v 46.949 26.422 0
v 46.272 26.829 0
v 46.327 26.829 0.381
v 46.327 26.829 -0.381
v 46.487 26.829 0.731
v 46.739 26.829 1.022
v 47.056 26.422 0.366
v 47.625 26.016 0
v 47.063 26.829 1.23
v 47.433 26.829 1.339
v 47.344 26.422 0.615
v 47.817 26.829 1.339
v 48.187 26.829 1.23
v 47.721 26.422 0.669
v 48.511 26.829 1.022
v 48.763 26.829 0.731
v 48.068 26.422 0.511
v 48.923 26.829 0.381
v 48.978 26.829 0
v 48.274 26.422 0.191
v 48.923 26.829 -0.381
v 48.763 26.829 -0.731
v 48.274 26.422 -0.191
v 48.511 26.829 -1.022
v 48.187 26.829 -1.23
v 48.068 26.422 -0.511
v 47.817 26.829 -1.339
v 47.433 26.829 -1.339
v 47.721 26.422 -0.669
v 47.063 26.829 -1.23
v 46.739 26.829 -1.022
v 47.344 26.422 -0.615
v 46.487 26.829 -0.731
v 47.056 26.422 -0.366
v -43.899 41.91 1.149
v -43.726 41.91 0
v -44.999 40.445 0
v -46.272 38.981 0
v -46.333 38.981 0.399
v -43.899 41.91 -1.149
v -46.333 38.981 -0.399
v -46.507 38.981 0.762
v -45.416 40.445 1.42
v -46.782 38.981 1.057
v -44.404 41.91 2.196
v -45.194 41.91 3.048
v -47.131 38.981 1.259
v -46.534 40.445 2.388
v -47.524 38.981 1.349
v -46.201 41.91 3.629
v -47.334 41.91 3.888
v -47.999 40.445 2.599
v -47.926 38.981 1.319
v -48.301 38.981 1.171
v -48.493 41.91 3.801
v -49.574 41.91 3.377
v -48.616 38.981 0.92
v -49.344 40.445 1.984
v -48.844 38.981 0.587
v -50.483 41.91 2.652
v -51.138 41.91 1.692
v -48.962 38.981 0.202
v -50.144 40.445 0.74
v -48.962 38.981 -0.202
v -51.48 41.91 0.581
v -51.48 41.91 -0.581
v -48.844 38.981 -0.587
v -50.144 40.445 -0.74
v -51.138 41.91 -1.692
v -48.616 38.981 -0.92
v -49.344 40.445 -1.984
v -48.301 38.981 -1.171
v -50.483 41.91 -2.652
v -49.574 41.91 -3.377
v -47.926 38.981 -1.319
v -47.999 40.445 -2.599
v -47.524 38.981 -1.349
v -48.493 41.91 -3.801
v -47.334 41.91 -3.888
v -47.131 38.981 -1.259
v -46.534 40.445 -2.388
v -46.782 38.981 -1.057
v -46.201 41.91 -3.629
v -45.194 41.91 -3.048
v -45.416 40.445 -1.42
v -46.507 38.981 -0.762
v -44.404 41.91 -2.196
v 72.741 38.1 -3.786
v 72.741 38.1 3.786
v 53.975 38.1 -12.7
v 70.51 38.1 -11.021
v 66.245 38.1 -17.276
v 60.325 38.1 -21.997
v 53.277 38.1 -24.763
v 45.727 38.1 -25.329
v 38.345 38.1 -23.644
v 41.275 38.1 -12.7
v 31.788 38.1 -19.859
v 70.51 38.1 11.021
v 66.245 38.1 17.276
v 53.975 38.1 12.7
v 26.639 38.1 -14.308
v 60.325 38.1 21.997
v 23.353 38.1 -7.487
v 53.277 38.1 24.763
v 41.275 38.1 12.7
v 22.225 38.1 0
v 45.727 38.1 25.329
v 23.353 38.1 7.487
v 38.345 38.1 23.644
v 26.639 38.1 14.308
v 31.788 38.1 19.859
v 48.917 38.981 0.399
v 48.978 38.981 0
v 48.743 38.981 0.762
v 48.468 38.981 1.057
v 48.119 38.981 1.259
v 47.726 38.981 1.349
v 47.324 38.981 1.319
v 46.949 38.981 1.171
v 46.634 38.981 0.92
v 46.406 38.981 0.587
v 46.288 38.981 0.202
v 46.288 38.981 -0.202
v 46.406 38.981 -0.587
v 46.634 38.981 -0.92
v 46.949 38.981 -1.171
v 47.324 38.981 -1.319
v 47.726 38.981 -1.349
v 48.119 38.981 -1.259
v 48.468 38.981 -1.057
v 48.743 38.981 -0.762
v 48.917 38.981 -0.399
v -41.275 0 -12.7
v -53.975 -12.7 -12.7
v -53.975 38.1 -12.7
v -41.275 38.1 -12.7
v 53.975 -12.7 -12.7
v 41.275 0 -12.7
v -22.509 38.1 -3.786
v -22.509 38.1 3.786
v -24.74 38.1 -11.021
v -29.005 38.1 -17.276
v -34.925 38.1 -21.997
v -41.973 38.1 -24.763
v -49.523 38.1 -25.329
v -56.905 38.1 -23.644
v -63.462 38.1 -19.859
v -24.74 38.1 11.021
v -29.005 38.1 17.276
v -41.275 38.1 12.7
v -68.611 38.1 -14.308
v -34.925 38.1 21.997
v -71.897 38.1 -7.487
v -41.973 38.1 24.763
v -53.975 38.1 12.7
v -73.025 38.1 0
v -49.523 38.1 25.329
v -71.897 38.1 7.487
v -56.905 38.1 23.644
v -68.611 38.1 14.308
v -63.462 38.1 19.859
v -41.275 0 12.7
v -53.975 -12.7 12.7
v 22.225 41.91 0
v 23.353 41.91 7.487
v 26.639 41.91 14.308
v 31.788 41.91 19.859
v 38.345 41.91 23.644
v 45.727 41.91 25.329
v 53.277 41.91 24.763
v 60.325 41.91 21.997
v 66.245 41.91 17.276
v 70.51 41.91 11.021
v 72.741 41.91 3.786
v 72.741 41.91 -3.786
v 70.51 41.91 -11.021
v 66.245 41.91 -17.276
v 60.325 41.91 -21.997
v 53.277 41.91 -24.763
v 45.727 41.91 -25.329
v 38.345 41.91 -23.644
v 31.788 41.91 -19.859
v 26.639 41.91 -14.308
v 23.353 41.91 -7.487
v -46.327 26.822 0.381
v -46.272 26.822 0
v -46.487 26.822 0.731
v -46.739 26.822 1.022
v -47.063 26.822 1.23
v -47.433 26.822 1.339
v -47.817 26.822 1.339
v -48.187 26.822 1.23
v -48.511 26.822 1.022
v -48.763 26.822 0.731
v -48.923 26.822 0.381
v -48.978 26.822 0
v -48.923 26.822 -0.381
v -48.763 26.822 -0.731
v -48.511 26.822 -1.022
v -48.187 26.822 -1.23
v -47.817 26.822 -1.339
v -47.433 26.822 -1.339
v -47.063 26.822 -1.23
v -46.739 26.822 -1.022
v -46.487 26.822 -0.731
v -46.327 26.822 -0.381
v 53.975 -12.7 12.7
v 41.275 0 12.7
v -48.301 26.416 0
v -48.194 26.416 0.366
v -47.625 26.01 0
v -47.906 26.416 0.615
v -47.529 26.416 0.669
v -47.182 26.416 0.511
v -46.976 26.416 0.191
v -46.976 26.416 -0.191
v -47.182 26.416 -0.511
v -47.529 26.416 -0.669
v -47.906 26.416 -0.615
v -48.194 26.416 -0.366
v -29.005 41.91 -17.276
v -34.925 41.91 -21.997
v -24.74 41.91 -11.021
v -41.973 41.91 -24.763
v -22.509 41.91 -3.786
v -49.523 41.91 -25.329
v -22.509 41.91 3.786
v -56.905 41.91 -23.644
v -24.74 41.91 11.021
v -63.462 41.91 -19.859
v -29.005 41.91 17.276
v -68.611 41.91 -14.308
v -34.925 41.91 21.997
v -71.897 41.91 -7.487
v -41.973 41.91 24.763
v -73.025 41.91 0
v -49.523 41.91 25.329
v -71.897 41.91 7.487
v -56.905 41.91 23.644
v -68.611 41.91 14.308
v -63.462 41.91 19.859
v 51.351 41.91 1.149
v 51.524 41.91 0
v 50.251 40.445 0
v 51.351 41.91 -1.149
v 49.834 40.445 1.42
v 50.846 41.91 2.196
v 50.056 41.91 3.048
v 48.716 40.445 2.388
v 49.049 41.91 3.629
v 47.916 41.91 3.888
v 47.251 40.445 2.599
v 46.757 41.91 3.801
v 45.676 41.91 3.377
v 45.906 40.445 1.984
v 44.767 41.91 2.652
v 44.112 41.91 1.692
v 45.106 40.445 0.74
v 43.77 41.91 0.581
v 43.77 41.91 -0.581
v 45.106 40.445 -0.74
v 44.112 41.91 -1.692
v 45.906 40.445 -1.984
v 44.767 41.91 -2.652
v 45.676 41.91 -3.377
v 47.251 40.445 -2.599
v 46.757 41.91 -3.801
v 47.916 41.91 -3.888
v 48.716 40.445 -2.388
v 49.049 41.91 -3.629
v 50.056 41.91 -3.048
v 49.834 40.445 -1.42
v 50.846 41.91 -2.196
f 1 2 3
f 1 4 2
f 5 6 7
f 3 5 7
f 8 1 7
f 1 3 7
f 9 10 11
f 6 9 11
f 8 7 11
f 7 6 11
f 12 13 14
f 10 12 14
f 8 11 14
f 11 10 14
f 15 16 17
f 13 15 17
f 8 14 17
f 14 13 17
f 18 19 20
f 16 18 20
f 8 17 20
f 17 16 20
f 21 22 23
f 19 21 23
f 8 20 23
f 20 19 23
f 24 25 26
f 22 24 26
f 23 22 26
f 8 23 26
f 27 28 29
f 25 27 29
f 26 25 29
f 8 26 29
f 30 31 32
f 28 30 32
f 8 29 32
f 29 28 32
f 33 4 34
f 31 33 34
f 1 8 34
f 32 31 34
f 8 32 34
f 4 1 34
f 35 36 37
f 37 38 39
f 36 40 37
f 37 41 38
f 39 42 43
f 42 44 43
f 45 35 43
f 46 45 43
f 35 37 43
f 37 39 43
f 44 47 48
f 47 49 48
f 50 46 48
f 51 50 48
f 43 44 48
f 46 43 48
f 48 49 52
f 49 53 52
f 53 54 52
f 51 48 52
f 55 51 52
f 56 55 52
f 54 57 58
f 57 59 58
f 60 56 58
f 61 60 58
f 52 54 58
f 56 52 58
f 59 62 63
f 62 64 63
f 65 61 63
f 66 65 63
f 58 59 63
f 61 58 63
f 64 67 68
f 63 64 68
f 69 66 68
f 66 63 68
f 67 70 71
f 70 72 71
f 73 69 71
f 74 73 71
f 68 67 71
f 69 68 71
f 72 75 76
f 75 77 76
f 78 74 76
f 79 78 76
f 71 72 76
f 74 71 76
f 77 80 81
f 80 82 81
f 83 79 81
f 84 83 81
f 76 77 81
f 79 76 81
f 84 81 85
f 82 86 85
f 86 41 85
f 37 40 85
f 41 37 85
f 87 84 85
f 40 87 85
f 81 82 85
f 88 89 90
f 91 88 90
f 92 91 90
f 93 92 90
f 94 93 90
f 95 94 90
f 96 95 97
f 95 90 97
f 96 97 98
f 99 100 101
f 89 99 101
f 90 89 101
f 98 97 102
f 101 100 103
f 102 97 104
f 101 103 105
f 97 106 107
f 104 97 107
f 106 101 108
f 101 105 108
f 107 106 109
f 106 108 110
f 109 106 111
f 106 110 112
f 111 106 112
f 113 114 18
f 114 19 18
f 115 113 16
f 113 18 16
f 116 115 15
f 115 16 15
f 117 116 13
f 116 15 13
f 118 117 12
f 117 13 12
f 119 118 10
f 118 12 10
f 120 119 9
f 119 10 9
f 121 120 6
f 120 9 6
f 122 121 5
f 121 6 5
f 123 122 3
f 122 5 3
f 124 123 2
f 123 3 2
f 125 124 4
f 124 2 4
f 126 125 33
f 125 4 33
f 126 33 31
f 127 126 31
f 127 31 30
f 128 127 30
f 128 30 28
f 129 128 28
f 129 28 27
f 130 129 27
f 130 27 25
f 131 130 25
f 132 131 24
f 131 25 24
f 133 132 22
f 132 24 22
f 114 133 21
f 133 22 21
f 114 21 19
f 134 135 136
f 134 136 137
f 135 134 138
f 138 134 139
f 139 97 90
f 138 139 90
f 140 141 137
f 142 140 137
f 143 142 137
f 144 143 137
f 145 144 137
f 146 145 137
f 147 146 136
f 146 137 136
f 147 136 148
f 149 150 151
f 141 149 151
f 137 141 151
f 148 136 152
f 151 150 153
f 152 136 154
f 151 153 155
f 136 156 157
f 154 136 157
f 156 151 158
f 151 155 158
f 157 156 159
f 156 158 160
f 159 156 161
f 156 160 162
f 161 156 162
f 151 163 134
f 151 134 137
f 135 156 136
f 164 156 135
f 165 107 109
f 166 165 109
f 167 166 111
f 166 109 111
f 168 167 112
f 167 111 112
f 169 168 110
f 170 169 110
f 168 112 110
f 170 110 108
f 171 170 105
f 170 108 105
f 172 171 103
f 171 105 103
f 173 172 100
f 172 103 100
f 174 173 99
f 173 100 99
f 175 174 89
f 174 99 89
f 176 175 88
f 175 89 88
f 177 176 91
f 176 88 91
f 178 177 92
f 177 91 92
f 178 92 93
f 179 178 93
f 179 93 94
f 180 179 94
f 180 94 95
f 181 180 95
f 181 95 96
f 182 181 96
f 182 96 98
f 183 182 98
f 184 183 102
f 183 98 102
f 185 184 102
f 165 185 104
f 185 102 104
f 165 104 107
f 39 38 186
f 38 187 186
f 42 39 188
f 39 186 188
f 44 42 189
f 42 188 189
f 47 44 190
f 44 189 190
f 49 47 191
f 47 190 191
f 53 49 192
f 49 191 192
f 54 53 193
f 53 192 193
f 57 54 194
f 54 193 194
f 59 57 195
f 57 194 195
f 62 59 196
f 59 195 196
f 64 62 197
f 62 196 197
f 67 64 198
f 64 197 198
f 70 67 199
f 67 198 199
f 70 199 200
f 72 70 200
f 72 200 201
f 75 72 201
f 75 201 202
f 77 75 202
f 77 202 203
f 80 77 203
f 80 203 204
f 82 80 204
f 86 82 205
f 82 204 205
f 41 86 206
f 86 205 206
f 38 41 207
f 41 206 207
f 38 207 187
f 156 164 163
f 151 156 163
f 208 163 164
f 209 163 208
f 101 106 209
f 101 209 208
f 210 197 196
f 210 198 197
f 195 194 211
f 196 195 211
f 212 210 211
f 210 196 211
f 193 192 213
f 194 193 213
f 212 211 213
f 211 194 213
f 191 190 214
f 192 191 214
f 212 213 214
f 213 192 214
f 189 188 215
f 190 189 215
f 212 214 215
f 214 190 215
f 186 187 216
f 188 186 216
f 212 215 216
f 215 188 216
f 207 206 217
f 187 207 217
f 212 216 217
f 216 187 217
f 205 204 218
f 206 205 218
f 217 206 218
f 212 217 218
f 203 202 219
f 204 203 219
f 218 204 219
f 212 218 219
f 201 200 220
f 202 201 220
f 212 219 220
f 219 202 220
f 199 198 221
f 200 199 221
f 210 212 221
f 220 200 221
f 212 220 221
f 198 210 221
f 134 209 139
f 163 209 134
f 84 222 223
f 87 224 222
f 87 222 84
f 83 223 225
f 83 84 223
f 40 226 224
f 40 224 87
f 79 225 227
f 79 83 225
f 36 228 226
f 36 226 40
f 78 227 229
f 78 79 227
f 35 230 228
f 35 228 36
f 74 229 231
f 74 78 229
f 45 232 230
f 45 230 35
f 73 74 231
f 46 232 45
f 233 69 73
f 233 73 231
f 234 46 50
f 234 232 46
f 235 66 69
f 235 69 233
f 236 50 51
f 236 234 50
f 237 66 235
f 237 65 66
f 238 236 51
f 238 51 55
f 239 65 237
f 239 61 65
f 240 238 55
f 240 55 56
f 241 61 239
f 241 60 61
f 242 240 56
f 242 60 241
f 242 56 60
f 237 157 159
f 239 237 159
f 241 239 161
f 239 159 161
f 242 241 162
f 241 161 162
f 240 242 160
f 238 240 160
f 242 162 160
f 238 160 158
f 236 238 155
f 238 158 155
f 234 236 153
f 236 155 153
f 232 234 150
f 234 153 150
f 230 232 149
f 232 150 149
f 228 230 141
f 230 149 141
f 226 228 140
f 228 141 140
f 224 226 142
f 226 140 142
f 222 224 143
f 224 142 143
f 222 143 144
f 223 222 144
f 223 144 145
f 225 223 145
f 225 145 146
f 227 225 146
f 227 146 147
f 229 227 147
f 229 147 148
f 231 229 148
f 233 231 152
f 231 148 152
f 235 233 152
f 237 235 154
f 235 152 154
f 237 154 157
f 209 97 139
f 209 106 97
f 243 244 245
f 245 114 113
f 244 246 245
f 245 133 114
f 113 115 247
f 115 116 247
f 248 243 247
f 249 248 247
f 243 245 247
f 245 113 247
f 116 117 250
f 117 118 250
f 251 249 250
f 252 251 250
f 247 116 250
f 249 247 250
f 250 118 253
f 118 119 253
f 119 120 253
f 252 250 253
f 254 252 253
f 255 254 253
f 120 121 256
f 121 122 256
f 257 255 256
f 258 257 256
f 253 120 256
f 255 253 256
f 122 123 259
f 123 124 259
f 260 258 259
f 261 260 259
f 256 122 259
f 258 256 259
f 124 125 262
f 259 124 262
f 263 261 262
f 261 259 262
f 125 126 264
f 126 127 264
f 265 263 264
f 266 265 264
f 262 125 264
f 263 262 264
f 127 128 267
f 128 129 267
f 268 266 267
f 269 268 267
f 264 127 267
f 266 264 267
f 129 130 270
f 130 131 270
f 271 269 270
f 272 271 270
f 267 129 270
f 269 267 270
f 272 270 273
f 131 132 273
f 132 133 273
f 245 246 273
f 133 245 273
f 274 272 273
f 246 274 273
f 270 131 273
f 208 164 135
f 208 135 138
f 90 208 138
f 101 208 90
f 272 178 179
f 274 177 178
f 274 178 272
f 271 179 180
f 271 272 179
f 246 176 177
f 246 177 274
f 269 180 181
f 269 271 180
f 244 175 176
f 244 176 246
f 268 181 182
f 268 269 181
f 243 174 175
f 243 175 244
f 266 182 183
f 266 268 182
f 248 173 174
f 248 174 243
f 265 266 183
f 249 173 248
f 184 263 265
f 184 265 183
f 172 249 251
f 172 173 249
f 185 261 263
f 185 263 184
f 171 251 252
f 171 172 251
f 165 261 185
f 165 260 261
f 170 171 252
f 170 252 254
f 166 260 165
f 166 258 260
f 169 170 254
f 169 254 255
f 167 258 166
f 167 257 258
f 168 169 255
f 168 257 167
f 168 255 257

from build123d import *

# Parameters (mm, degrees)
F1_DEPTH       = 12.7
F3_R           = 25.4
F3_W           = 12.7
F3_H           = 25.4
F2_R           = 25.4
F2_W           = 12.7
F2_H           = 25.4
F4_DEPTH       = 3.81
F6_D           = 2.7051
F6_DEPTH       = 15.08125
F6_CSINK_D     = 7.7978
F6_CSINK_ANGLE = 82
F6_TIP         = 0.8126940303
F8_D           = 2.7051
F8_DEPTH       = 15.0876
F8_CSINK_D     = 7.7978
F8_CSINK_ANGLE = 82
F8_TIP         = 0.8126940303


with BuildPart() as f1:
    # F0 (on Top) → F1 (new body, symmetric)
    with BuildSketch(Plane.XY):
        Polygon((41.275, 0), (-41.275, 0), (-41.275, 38.1), (-53.975, 38.1), (-53.975, -12.7), (53.975, -12.7), (53.975, 38.1), (41.275, 38.1), align=None)
    extrude(amount=F1_DEPTH, both=True)

    # F3 (on face) + F2 (on face) → F4 (join)
    with BuildSketch(Plane(origin=(0, 38.1, 0), x_dir=(-1, 0, 0), z_dir=(0, 1, 0))):
        with Locations((47.625, 0)):
            Circle(F3_R)
        with Locations((47.625, 0)):
            Rectangle(F3_W, F3_H, mode=Mode.SUBTRACT)
        with Locations((47.625, 0)):
            Rectangle(F3_W, F3_H)
    with BuildSketch(Plane(origin=(0, 38.1, 0), x_dir=(-1, 0, 0), z_dir=(0, 1, 0))):
        with Locations((-47.625, 0)):
            Circle(F2_R)
        with Locations((-47.625, 0)):
            Rectangle(F2_W, F2_H, mode=Mode.SUBTRACT)
        with Locations((-47.625, 0)):
            Rectangle(F2_W, F2_H)
    extrude(amount=F4_DEPTH)

    # F6
    with Locations(Plane(origin=(0, 41.91, 0), x_dir=(-1, 0, 0), z_dir=(0, 1, 0))):
        with Locations((-47.625, 0)):
            CounterSinkHole(F6_D / 2, F6_CSINK_D / 2, depth=F6_DEPTH, counter_sink_angle=F6_CSINK_ANGLE)
            with Locations((0, 0, -(F6_DEPTH + F6_TIP / 2))):  # 118° drill point
                Cone(0, F6_D / 2, F6_TIP, mode=Mode.SUBTRACT)

    # F8
    with Locations(Plane(origin=(0, 41.91, 0), x_dir=(-1, 0, 0), z_dir=(0, 1, 0))):
        with Locations((47.625, 0)):
            CounterSinkHole(F8_D / 2, F8_CSINK_D / 2, depth=F8_DEPTH, counter_sink_angle=F8_CSINK_ANGLE)
            with Locations((0, 0, -(F8_DEPTH + F8_TIP / 2))):  # 118° drill point
                Cone(0, F8_D / 2, F8_TIP, mode=Mode.SUBTRACT)


solid = f1.part
